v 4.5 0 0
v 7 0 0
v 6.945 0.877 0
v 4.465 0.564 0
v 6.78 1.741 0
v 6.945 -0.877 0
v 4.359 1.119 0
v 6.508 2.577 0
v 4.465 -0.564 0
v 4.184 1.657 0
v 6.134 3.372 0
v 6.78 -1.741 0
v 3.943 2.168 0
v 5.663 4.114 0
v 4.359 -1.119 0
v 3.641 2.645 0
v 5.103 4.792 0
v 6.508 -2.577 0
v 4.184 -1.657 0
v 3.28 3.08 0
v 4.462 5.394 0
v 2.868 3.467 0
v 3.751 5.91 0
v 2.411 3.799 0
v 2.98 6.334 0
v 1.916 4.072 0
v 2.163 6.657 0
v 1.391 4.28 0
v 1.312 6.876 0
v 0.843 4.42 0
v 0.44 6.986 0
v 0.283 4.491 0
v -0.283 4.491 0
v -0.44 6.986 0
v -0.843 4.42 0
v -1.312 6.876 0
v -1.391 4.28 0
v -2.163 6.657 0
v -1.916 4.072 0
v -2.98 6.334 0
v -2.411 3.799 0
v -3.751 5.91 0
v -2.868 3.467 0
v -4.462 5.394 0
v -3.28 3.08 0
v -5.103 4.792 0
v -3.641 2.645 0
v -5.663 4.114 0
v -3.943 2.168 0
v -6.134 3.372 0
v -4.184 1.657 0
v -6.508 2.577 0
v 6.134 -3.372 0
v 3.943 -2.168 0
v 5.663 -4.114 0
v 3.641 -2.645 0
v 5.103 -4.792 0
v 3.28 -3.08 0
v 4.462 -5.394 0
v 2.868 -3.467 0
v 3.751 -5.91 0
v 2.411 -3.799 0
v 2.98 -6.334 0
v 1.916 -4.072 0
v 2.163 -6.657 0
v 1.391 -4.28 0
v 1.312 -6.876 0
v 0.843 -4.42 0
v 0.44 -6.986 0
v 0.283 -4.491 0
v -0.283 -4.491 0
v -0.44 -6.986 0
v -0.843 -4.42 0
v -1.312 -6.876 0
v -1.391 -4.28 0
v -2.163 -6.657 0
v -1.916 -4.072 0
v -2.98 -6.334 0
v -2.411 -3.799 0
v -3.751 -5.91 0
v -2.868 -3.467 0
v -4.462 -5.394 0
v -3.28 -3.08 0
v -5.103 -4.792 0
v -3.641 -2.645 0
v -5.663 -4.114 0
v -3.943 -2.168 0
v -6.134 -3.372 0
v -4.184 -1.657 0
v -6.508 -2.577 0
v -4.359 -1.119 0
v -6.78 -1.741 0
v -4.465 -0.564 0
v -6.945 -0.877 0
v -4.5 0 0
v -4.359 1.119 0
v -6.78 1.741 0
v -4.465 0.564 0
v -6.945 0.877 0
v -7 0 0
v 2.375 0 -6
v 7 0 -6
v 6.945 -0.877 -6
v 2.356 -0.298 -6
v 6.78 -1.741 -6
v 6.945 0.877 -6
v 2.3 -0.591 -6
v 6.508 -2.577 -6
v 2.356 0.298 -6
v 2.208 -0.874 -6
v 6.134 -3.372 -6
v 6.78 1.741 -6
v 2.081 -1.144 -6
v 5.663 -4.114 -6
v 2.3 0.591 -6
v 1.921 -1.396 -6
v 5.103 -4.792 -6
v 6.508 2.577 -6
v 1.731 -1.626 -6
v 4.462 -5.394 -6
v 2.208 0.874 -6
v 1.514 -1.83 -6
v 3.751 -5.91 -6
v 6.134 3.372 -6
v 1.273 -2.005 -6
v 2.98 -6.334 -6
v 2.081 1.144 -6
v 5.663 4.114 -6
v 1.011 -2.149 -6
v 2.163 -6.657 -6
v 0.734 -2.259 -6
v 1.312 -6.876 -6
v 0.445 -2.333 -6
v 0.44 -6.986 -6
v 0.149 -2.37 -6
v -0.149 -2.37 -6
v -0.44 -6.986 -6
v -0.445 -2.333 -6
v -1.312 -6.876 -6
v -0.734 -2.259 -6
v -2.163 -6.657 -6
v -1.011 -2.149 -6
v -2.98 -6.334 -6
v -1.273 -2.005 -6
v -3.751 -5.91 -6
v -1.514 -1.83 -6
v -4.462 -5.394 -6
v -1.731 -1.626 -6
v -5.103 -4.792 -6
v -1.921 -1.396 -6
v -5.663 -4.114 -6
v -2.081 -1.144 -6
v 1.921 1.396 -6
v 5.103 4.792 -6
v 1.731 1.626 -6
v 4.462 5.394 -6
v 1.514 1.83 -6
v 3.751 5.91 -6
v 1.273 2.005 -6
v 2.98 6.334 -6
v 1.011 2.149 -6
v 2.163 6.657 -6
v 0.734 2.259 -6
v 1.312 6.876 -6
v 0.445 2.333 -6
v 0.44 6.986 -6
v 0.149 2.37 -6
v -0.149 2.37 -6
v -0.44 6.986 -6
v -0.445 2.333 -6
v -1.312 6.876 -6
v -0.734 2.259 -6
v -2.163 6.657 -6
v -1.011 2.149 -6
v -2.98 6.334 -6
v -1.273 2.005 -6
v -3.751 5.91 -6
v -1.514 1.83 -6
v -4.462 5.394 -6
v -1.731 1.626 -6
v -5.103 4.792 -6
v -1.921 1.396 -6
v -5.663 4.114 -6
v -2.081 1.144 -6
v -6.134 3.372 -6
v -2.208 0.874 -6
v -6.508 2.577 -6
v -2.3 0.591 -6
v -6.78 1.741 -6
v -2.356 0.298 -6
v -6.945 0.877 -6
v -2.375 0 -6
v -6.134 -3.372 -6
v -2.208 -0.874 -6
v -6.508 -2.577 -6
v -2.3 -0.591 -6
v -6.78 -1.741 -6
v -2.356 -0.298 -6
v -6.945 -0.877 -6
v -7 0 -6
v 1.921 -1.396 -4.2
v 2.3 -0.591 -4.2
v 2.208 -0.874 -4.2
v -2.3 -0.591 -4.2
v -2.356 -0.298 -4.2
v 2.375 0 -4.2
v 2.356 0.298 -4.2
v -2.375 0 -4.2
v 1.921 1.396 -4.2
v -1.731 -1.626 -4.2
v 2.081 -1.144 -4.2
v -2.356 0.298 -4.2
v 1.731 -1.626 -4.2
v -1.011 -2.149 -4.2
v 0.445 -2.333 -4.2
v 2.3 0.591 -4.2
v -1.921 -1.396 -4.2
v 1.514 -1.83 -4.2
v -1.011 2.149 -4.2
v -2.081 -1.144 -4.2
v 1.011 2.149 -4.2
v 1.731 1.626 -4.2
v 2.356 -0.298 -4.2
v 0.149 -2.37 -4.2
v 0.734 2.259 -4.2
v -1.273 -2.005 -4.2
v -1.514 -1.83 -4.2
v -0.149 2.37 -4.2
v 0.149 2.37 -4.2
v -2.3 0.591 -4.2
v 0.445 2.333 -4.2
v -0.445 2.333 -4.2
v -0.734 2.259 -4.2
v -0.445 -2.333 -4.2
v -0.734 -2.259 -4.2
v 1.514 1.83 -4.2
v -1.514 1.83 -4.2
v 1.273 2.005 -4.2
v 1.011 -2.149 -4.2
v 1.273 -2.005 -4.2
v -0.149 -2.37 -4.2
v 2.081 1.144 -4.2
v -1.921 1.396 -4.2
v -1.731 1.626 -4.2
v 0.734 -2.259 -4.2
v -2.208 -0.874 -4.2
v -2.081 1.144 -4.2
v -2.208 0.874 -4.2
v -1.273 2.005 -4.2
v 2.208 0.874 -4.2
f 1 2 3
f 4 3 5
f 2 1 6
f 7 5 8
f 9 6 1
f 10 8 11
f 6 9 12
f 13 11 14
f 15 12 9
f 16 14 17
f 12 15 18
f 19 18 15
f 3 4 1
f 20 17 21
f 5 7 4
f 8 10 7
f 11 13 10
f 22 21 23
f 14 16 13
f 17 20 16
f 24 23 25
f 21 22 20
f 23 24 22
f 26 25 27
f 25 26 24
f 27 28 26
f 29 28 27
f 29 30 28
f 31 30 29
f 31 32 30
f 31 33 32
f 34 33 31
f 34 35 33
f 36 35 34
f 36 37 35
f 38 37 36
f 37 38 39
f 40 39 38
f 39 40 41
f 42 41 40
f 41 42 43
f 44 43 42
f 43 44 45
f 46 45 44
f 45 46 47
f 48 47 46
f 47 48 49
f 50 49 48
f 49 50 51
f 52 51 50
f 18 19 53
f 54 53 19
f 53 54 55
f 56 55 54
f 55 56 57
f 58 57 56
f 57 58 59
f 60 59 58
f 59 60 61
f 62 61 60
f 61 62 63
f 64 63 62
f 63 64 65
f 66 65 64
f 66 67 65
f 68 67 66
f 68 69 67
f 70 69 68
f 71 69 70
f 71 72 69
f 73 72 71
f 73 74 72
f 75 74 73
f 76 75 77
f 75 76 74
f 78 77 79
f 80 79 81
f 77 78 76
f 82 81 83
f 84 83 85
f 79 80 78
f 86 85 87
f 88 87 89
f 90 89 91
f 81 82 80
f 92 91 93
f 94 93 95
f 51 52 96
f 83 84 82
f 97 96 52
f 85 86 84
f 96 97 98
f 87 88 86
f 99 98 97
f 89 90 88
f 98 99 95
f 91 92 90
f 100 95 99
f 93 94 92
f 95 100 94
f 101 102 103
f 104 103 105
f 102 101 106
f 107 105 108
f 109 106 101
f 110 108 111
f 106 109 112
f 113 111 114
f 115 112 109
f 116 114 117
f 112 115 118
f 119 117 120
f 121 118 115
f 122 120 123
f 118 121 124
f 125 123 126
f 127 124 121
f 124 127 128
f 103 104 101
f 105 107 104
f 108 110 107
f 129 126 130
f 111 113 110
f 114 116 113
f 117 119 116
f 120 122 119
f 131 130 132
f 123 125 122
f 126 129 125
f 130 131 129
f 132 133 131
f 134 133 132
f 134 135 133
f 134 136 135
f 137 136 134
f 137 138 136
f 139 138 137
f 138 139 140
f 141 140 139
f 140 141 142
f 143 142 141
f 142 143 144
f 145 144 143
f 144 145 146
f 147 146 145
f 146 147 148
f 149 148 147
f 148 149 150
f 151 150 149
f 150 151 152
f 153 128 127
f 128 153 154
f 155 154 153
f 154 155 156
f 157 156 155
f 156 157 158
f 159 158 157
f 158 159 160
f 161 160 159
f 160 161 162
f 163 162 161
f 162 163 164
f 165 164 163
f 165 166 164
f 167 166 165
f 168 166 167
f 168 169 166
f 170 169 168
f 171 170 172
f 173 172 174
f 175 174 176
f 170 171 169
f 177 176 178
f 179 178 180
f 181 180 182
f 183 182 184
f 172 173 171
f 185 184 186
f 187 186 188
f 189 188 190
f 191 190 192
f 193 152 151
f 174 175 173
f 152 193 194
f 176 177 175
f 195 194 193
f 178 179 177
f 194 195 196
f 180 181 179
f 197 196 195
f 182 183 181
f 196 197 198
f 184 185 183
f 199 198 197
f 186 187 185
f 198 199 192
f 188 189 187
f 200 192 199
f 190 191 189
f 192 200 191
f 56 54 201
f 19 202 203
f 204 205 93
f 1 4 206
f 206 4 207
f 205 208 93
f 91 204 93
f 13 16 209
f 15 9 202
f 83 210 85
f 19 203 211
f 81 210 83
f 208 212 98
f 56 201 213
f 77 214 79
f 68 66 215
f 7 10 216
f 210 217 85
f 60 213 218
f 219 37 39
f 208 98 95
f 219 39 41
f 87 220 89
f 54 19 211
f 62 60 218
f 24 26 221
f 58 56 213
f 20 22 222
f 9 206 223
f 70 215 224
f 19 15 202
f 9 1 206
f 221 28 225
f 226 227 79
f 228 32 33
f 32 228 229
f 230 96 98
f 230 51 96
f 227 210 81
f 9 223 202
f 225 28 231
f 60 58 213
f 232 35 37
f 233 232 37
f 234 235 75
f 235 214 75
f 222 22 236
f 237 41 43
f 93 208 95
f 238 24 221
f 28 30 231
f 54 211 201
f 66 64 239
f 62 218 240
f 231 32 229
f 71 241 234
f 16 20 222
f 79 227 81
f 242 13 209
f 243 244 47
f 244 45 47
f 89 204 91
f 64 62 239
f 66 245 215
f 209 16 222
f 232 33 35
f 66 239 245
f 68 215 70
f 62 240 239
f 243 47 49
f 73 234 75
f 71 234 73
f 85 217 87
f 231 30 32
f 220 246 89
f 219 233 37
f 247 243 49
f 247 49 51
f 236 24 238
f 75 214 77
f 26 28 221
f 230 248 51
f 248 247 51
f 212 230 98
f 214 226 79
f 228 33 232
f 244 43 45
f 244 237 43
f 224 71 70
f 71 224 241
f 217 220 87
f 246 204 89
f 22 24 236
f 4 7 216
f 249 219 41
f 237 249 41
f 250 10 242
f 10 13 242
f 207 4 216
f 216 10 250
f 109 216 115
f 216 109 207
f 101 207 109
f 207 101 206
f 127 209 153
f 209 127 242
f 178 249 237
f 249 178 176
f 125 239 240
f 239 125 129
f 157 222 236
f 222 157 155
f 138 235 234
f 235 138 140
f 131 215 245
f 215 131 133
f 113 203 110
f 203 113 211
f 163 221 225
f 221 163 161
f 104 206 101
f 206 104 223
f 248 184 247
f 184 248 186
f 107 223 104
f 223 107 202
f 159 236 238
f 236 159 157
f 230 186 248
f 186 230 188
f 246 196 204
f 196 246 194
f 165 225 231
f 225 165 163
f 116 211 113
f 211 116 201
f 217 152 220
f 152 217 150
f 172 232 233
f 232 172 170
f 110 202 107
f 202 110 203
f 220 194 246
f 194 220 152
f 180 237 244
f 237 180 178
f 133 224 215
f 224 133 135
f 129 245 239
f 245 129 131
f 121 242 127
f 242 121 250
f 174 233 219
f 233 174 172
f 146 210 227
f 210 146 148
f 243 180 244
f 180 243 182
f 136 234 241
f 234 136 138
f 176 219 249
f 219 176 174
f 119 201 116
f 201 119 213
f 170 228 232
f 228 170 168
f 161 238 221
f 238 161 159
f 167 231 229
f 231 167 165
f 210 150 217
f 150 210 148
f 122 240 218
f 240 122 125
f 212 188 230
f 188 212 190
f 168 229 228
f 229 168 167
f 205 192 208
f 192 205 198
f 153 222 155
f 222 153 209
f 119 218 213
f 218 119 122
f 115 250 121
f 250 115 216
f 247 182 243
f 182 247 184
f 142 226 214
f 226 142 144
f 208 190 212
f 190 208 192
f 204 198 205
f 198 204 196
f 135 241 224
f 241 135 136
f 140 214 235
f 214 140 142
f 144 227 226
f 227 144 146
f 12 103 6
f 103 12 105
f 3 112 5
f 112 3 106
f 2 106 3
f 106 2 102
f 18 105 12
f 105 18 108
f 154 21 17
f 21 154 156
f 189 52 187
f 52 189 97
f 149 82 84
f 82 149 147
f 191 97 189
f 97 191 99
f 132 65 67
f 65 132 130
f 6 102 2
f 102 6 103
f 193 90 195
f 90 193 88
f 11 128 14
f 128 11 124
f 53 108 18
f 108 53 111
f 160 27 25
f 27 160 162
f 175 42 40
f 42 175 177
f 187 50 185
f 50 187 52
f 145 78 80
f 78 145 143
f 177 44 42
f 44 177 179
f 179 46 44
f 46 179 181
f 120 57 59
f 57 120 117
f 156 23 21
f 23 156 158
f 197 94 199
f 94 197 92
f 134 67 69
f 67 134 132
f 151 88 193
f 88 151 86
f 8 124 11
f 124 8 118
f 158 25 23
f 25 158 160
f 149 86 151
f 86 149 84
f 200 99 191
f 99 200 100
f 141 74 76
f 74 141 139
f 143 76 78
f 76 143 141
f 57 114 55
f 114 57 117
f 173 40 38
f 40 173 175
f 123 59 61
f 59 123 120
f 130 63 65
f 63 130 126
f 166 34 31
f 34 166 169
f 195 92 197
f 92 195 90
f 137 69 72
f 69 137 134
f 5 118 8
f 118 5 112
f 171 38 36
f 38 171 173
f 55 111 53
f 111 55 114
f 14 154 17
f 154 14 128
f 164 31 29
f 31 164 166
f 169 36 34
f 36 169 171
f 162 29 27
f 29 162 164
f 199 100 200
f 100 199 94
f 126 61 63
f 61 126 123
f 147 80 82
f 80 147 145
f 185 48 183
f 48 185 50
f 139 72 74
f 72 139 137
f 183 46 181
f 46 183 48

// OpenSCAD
$fn = 50;


difference() {
	union() {
		translate(v = [0, 0, -6.0000000000]) {
			cylinder(h = 6, r = 7.0000000000);
		}
		cylinder(h = 0, r = 16.0000000000);
	}
	union() {
		translate(v = [0, 0, 0]) {
			rotate(a = [0, 0, 0]) {
				difference() {
					union() {
						#translate(v = [0, 0, -6.0000000000]) {
							cylinder(h = 6, r = 2.2500000000);
						}
						#translate(v = [0, 0, -4.2000000000]) {
							cylinder(h = 4.2000000000, r1 = 2.3750000000, r2 = 4.5000000000);
						}
						#translate(v = [0, 0, -6.0000000000]) {
							cylinder(h = 6, r = 2.3750000000);
						}
						#translate(v = [0, 0, -6.0000000000]) {
							cylinder(h = 6, r = 2.2500000000);
						}
					}
					union();
				}
			}
		}
	}
}
